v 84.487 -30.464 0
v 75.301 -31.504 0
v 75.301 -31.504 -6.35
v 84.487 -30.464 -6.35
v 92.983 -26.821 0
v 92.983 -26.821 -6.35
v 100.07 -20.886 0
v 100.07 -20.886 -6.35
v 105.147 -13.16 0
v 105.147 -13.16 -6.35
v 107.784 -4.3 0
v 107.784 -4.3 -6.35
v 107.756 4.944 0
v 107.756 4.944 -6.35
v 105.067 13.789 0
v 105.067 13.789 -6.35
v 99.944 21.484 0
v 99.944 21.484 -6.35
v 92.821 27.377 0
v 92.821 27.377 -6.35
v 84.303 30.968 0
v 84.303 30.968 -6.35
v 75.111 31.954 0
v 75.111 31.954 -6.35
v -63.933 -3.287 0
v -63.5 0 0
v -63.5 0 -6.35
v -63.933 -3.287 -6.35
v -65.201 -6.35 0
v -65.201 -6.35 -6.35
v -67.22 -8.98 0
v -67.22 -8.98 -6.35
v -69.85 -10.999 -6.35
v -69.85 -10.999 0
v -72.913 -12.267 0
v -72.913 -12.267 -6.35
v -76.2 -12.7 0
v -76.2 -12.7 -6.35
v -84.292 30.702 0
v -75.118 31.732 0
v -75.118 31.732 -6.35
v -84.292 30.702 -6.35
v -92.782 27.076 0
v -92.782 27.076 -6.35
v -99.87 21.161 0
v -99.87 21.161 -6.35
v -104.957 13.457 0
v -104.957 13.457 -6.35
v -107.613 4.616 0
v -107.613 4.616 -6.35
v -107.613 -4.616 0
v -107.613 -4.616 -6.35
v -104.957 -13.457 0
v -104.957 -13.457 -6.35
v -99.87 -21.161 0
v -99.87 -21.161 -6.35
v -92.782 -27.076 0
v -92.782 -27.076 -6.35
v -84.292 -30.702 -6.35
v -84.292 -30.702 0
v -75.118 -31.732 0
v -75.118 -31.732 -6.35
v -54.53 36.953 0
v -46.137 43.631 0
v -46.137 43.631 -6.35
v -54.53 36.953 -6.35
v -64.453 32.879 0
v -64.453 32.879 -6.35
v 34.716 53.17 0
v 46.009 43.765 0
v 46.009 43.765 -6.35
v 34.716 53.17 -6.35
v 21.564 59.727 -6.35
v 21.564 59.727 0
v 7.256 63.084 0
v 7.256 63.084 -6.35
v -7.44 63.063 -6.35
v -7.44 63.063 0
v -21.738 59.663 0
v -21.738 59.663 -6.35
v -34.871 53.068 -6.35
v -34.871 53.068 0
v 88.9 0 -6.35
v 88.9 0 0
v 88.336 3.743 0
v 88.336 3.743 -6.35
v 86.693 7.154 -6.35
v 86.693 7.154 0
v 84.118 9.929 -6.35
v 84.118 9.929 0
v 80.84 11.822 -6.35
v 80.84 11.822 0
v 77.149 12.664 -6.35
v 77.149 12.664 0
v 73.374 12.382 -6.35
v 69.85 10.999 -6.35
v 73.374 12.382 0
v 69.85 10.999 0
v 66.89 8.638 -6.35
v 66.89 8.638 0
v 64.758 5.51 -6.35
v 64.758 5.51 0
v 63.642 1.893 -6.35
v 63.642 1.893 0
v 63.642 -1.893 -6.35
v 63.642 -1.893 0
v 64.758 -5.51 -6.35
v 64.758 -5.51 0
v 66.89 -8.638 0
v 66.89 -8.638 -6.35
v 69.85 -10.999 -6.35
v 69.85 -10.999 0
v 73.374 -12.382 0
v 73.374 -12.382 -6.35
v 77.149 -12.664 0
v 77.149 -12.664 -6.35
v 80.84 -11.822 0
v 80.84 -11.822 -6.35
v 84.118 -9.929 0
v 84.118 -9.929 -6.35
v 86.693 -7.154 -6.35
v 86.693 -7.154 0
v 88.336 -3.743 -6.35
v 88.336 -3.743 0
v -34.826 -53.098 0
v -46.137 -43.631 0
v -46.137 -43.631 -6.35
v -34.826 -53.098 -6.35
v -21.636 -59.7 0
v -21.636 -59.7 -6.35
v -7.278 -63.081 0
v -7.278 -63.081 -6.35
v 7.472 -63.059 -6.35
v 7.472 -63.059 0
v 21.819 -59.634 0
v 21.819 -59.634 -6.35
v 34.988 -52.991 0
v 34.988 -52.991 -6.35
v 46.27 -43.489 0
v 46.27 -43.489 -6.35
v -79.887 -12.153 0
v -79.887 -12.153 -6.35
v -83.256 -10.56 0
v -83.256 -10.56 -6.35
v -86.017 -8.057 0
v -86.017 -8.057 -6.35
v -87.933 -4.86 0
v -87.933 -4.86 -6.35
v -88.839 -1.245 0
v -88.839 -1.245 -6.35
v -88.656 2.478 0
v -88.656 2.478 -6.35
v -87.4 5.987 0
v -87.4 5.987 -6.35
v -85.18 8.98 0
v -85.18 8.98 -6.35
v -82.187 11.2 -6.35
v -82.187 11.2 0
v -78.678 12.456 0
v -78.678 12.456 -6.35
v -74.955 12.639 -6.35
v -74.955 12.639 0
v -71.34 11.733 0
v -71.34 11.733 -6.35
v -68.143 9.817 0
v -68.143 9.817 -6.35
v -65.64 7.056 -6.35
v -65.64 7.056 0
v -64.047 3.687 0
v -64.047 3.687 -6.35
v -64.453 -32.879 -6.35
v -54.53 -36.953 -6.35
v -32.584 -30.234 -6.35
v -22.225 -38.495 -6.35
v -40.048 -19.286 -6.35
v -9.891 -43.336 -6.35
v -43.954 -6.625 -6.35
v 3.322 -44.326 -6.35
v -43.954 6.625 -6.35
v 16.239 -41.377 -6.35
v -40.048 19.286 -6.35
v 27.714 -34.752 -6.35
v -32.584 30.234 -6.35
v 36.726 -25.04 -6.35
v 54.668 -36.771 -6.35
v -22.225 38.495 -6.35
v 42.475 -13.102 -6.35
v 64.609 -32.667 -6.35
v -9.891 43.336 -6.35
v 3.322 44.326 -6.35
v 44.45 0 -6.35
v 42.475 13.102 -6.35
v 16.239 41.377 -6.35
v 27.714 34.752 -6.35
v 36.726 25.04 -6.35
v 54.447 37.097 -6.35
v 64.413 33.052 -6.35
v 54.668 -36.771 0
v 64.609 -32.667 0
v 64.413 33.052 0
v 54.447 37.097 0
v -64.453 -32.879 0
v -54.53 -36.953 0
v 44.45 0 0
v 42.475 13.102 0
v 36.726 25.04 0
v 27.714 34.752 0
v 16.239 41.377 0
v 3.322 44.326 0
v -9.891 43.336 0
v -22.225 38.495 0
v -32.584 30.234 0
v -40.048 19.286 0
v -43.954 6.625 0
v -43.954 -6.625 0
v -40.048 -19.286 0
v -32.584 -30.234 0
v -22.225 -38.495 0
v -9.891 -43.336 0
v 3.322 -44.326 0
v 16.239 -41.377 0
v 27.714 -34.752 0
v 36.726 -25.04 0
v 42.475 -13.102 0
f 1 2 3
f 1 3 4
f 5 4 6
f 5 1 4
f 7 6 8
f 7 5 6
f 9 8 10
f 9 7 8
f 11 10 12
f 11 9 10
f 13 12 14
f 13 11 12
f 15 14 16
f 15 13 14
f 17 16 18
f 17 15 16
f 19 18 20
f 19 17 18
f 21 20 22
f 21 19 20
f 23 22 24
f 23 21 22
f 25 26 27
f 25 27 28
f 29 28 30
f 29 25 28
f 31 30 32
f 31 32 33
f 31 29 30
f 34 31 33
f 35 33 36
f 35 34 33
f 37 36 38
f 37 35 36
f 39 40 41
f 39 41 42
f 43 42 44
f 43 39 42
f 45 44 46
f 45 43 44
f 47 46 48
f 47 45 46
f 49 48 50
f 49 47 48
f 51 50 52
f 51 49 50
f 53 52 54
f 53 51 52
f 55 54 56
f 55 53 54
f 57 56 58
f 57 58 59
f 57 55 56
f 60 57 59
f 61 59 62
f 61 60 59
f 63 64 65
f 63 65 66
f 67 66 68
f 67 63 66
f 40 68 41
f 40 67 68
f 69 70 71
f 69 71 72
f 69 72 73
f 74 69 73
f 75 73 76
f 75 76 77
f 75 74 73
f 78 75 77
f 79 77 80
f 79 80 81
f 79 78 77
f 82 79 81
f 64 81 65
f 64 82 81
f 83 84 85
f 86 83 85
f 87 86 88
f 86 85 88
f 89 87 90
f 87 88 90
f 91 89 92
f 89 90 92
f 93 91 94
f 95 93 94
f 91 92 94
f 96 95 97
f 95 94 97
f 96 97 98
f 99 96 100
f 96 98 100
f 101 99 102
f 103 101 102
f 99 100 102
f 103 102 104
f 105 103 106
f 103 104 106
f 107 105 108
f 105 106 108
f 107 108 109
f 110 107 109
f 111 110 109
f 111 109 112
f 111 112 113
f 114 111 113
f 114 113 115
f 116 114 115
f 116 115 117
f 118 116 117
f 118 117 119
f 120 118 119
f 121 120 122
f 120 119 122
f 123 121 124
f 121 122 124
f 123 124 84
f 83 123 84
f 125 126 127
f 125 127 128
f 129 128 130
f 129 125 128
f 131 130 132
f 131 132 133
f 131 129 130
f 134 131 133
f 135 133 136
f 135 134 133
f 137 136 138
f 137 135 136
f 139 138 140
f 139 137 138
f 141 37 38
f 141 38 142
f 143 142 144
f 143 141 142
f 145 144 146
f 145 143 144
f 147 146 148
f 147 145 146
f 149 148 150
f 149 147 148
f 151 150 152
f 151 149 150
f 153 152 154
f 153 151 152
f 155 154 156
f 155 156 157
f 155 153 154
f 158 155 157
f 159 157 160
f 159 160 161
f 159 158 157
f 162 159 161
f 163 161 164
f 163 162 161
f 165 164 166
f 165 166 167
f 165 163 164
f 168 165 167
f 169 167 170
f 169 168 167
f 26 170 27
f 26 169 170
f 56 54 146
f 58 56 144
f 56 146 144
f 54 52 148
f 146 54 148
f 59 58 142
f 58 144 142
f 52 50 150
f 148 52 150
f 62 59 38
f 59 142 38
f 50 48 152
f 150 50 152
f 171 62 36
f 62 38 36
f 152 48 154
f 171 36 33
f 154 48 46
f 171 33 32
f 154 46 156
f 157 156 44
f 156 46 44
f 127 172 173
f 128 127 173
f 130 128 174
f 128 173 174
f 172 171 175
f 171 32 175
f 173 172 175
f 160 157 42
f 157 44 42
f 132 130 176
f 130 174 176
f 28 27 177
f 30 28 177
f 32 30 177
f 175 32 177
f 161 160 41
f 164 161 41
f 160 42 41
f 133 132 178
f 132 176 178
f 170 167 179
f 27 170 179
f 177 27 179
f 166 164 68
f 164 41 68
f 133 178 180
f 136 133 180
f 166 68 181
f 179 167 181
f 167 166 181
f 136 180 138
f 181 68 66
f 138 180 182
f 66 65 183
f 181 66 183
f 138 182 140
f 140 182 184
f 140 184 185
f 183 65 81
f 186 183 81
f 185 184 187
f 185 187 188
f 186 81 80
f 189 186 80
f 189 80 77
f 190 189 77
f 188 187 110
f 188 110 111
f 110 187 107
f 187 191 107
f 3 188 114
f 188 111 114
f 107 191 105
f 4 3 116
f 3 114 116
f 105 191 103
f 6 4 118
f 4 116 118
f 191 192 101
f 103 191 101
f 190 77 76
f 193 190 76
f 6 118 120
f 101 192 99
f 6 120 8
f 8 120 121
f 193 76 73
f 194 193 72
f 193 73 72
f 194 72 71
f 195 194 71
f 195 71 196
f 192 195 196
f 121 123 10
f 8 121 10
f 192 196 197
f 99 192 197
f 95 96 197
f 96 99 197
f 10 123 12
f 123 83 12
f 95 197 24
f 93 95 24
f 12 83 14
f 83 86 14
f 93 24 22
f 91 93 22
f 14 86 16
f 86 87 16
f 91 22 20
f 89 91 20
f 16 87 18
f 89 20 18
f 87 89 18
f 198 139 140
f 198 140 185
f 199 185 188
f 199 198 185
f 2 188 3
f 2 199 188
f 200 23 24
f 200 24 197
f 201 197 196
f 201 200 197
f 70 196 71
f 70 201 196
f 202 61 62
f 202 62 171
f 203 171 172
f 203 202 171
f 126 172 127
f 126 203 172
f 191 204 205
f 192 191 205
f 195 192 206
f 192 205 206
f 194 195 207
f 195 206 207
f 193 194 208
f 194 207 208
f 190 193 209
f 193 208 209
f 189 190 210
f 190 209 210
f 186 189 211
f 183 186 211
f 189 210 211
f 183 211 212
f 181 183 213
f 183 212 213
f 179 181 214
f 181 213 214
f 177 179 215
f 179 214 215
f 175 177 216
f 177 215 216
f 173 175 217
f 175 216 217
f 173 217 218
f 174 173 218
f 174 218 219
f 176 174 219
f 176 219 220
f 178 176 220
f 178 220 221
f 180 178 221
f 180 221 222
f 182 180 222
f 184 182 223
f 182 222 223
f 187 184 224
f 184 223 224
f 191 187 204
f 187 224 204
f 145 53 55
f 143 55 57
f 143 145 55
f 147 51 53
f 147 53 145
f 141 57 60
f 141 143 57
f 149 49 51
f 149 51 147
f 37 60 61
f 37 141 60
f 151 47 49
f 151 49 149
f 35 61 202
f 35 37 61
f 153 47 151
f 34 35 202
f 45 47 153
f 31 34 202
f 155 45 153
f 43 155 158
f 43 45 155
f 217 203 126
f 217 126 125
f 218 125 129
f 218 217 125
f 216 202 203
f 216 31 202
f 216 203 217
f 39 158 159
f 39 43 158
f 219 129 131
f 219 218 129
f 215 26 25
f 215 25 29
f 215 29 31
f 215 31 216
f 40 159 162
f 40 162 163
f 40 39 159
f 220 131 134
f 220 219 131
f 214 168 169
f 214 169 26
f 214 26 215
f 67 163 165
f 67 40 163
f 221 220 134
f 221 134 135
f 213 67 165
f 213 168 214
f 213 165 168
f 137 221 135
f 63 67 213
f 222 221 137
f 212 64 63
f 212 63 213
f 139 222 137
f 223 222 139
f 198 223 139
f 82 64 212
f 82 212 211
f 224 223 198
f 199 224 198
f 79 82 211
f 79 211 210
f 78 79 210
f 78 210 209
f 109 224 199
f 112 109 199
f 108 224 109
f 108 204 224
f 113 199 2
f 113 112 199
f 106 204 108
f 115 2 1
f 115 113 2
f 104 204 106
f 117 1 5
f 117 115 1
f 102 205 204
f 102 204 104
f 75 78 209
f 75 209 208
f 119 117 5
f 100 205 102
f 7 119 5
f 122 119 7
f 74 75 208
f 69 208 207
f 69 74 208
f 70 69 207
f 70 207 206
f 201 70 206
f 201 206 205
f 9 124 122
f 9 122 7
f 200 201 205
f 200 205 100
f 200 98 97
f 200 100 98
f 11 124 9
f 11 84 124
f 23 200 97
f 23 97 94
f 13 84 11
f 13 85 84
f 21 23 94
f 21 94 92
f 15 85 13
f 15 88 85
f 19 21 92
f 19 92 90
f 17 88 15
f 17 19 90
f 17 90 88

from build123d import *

# Parameters (mm, degrees)
F0_R     = 44.45
F0_R_2   = 12.7
F1_DEPTH = 6.35


with BuildPart() as f1:
    # F0 (on Top) → F1 (new body)
    with BuildSketch(Plane.XY):
        with BuildLine():
            ThreePointArc((-76.2, -12.7), (-67.219744, -8.980256), (-63.5, 0))
            ThreePointArc((-63.5, 0), (-85.180256, 8.980256), (-76.2, -12.7))
        make_face()
        with BuildLine():
            ThreePointArc((-46.136719, 43.630874), (-59.347524, 34.564632), (-75.117614, 31.731545))
            ThreePointArc((-75.117614, 31.731545), (-107.95, 0), (-75.117614, -31.731545))
            ThreePointArc((-75.117614, -31.731545), (-59.347524, -34.564632), (-46.136719, -43.630874))
            ThreePointArc((-46.136719, -43.630874), (0.097237, -63.499926), (46.270126, -43.489372))
            ThreePointArc((46.270126, -43.489372), (59.493096, -34.366174), (75.300953, -31.504125))
            ThreePointArc((75.300953, -31.504125), (108.108105, 0.323178), (75.111252, 31.953768))
            ThreePointArc((75.111252, 31.953768), (59.286566, 34.721254), (46.009287, 43.765232))
            ThreePointArc((46.009287, 43.765232), (-0.092589, 63.499932), (-46.136719, 43.630874))
        make_face()
        with BuildLine():
            ThreePointArc((-76.2, -12.7), (-85.180256, 8.980256), (-63.5, 0))
            ThreePointArc((-63.5, 0), (-67.219744, -8.980256), (-76.2, -12.7))
        make_face(mode=Mode.SUBTRACT)
        Circle(F0_R, mode=Mode.SUBTRACT)
        with Locations((76.2, 0)):
            Circle(F0_R_2, mode=Mode.SUBTRACT)
    extrude(amount=-F1_DEPTH)


solid = f1.part
